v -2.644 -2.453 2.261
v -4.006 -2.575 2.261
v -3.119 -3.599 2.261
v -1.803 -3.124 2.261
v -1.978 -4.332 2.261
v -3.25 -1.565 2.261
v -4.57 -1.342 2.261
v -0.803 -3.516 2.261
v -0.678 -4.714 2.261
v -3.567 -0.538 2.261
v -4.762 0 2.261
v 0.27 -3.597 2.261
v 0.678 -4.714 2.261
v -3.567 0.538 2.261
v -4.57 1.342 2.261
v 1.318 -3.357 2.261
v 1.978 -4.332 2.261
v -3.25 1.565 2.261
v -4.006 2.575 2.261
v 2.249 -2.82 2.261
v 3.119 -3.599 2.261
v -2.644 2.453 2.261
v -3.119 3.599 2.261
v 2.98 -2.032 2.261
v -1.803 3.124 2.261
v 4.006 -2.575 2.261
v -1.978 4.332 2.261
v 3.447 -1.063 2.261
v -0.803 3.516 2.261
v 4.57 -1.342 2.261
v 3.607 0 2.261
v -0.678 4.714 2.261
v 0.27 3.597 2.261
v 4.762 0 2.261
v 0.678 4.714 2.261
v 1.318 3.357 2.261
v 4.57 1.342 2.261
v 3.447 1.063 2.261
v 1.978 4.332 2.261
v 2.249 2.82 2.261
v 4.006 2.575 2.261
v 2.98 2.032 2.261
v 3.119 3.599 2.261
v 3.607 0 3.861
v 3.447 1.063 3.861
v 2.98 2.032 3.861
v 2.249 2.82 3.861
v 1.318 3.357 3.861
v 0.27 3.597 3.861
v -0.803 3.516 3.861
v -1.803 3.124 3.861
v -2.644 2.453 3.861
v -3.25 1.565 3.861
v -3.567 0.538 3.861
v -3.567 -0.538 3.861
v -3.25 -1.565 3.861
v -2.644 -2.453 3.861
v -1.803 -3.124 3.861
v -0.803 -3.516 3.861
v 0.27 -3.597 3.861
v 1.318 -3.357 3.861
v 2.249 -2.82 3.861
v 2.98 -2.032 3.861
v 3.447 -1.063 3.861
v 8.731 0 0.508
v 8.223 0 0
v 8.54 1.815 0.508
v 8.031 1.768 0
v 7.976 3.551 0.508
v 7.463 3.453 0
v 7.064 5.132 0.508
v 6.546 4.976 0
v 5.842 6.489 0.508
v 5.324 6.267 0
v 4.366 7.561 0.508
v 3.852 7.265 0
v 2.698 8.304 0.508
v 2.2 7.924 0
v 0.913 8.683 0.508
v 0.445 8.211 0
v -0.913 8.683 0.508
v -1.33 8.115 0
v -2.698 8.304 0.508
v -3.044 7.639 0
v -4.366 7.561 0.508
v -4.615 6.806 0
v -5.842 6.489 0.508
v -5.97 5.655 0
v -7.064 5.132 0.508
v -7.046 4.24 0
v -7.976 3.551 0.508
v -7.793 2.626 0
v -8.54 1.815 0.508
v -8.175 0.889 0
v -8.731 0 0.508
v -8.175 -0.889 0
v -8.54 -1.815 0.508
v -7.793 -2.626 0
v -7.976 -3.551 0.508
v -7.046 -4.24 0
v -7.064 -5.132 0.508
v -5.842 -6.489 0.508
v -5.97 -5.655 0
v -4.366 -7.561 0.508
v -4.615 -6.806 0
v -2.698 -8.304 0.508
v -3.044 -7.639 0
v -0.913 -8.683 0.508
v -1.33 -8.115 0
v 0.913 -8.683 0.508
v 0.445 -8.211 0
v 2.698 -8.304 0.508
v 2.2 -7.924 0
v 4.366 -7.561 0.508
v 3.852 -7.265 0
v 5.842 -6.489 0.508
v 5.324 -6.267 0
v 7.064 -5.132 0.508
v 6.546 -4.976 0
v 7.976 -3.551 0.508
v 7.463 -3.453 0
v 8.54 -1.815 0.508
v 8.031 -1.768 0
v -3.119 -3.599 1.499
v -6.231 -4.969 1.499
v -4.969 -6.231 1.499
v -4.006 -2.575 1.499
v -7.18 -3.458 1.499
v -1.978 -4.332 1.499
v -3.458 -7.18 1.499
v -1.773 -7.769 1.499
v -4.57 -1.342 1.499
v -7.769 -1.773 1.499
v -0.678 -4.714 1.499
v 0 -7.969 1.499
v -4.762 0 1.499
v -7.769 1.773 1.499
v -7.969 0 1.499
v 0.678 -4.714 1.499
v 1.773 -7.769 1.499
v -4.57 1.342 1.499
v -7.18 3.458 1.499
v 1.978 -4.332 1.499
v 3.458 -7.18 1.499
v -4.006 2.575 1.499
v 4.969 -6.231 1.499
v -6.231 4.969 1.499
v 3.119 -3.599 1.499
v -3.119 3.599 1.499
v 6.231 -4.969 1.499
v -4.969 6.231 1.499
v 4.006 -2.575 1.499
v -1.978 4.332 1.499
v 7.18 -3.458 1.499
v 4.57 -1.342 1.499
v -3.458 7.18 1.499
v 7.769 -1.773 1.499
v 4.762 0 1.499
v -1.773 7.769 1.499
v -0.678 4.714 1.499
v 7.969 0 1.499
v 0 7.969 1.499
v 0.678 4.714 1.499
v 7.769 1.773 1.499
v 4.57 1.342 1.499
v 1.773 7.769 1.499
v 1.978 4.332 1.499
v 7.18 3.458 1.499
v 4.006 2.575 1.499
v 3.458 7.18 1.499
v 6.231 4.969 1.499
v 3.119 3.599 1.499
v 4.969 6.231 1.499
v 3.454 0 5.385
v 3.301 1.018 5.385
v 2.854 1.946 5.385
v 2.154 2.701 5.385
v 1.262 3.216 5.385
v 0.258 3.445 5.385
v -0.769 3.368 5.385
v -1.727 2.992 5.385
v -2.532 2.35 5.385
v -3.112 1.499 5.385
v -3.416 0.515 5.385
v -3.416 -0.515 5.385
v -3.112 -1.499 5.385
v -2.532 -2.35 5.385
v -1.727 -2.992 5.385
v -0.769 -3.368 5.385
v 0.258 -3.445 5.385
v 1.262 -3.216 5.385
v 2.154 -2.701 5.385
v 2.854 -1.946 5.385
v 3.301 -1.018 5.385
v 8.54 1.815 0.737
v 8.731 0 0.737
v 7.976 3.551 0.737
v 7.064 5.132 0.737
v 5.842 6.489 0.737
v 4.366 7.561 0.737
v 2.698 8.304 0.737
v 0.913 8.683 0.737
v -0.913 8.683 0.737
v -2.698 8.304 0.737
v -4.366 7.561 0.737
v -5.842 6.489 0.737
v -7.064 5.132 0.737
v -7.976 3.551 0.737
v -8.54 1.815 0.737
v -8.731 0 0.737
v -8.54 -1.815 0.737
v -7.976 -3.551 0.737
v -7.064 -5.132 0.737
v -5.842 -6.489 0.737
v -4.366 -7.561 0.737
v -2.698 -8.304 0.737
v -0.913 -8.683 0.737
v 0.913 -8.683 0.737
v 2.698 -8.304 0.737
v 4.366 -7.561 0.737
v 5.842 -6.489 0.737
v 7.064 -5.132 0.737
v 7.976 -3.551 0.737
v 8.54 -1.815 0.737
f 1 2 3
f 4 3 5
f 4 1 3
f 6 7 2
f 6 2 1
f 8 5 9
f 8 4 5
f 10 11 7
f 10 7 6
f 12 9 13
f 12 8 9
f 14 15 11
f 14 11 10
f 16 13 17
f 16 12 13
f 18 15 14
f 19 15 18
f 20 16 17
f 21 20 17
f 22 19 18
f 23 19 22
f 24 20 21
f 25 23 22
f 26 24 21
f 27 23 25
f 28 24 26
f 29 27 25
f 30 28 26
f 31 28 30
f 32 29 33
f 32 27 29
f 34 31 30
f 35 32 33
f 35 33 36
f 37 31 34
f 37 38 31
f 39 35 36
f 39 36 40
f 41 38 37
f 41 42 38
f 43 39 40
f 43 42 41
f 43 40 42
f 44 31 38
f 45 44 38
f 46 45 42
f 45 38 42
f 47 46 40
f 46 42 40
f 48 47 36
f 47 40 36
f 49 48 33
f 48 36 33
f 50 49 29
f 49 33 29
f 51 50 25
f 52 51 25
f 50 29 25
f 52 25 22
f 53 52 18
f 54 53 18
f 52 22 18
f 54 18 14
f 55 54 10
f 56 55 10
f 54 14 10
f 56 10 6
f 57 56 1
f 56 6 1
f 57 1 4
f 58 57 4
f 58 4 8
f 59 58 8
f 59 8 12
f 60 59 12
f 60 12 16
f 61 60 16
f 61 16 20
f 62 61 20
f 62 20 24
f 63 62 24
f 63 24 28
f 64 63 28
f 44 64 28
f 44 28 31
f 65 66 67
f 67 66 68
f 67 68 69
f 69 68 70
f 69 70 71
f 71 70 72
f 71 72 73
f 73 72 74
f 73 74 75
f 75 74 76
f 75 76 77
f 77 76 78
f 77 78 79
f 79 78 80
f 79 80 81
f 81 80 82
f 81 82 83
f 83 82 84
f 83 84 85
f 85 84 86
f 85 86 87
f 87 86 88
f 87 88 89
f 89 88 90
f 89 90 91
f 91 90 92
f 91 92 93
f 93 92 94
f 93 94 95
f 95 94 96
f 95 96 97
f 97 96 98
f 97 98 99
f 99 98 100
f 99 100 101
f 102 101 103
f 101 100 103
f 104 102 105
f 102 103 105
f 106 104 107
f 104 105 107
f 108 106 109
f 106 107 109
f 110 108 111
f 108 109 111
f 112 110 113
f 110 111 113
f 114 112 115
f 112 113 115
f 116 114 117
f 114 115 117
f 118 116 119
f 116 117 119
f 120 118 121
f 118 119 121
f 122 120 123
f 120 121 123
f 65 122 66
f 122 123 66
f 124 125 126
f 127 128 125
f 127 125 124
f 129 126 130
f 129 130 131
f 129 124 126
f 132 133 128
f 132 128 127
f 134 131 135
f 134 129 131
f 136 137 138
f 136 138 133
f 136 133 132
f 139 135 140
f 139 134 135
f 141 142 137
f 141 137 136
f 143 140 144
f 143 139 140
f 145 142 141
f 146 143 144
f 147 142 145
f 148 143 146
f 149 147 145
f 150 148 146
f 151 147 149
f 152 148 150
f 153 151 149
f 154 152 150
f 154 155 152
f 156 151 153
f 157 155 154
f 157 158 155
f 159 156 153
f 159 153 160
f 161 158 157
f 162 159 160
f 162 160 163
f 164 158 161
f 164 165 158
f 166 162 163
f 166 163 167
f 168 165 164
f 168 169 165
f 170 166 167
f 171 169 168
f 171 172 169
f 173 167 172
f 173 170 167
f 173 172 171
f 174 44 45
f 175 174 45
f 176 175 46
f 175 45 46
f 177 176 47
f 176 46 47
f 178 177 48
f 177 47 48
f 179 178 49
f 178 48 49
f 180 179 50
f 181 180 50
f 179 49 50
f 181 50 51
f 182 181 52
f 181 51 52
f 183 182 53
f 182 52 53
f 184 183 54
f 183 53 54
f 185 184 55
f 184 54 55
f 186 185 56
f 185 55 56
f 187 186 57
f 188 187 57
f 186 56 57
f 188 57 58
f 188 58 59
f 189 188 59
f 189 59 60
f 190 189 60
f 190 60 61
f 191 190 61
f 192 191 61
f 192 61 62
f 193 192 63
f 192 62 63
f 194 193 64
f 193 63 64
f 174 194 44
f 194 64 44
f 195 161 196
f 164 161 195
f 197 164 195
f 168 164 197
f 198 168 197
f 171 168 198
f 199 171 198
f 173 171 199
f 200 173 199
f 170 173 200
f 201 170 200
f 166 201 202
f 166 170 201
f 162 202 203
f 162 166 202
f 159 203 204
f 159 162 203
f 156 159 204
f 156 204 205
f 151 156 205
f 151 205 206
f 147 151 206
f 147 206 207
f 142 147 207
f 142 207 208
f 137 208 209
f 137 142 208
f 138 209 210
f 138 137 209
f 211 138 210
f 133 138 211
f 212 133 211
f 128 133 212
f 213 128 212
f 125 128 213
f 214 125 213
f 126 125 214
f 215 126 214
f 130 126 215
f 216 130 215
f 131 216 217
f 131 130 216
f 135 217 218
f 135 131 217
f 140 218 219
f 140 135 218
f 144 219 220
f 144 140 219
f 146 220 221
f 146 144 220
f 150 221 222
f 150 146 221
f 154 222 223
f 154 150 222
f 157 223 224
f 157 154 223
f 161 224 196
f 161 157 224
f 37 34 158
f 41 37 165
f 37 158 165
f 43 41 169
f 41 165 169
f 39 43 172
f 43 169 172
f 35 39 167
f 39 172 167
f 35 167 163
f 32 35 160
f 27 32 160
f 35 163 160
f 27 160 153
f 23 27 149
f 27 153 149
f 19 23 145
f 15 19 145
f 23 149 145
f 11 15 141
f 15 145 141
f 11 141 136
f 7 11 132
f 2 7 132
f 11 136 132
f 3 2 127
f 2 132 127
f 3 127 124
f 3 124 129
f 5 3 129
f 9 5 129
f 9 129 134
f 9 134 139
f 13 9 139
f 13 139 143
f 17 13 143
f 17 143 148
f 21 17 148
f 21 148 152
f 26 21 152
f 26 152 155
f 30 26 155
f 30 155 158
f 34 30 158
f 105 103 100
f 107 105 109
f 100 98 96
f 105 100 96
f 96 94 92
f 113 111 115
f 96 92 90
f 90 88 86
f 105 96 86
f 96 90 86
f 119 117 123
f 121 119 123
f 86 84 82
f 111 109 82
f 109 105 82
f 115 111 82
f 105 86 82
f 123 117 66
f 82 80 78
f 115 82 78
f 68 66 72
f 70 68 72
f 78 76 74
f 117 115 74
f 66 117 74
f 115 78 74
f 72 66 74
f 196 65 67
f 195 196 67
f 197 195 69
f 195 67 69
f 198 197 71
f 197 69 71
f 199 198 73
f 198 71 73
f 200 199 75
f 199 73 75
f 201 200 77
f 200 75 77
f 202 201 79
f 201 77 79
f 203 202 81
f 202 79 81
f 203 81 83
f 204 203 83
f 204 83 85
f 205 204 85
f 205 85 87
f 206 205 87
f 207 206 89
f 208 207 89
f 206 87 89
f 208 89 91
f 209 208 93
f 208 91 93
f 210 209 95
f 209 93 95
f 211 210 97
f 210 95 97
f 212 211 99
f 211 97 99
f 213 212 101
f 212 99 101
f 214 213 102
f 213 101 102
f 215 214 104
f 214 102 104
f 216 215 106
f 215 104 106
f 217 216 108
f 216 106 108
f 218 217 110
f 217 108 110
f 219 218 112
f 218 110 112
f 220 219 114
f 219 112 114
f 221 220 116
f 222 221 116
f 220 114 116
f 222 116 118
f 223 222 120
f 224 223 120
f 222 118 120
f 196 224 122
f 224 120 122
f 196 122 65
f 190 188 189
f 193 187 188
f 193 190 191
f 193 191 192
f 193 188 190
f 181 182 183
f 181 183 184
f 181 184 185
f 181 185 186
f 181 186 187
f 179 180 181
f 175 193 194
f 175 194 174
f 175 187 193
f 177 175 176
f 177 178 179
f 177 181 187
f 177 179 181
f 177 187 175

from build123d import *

# Parameters (mm, degrees)
F0_R     = 8.73125
F0_R_2   = 4.7625
F0_R_3   = 3.6068
F1_DEPTH = 1.4986
F2_DEPTH = 2.2606
F3_DEPTH = 5.3848
F4_SIZE  = 0.762
F5_SIZE  = 0.508
F6_SIZE2 = 1.524
F6_SIZE  = 0.1524


with BuildPart() as f1:
    # F0 (on Top) → F1 (new body)
    with BuildSketch(Plane.XY):
        Circle(F0_R)
        Circle(F0_R_2, mode=Mode.SUBTRACT)
        Circle(F0_R_2)
        Circle(F0_R_3, mode=Mode.SUBTRACT)
        Circle(F0_R_3)
    extrude(amount=F1_DEPTH)

    # F0 (on Top) → F2 (join)
    with BuildSketch(Plane.XY):
        Circle(F0_R_2)
        Circle(F0_R_3, mode=Mode.SUBTRACT)
        Circle(F0_R_3)
    extrude(amount=F2_DEPTH)

    # F0 (on Top) → F3 (join)
    with BuildSketch(Plane.XY):
        Circle(F0_R_3)
    extrude(amount=F3_DEPTH)

    # F4
    f4_edges = [f1.edges().sort_by_distance(p)[0] for p in [
        (-8.73125, 0, 1.4986),
    ]]
    chamfer(f4_edges, length=F4_SIZE)

    # F5
    f5_edges = [f1.edges().sort_by_distance(p)[0] for p in [
        (-8.73125, 0, 0),
    ]]
    chamfer(f5_edges, length=F5_SIZE)

    # F6
    f6_edges = [f1.edges().sort_by_distance(p)[0] for p in [
        (-3.6068, 0, 5.3848),
    ]]
    f6_side = f1.faces().sort_by_distance((0, 0, 5.3848))[0]
    chamfer(f6_edges, length=F6_SIZE, length2=F6_SIZE2, reference=f6_side)


solid = f1.part
